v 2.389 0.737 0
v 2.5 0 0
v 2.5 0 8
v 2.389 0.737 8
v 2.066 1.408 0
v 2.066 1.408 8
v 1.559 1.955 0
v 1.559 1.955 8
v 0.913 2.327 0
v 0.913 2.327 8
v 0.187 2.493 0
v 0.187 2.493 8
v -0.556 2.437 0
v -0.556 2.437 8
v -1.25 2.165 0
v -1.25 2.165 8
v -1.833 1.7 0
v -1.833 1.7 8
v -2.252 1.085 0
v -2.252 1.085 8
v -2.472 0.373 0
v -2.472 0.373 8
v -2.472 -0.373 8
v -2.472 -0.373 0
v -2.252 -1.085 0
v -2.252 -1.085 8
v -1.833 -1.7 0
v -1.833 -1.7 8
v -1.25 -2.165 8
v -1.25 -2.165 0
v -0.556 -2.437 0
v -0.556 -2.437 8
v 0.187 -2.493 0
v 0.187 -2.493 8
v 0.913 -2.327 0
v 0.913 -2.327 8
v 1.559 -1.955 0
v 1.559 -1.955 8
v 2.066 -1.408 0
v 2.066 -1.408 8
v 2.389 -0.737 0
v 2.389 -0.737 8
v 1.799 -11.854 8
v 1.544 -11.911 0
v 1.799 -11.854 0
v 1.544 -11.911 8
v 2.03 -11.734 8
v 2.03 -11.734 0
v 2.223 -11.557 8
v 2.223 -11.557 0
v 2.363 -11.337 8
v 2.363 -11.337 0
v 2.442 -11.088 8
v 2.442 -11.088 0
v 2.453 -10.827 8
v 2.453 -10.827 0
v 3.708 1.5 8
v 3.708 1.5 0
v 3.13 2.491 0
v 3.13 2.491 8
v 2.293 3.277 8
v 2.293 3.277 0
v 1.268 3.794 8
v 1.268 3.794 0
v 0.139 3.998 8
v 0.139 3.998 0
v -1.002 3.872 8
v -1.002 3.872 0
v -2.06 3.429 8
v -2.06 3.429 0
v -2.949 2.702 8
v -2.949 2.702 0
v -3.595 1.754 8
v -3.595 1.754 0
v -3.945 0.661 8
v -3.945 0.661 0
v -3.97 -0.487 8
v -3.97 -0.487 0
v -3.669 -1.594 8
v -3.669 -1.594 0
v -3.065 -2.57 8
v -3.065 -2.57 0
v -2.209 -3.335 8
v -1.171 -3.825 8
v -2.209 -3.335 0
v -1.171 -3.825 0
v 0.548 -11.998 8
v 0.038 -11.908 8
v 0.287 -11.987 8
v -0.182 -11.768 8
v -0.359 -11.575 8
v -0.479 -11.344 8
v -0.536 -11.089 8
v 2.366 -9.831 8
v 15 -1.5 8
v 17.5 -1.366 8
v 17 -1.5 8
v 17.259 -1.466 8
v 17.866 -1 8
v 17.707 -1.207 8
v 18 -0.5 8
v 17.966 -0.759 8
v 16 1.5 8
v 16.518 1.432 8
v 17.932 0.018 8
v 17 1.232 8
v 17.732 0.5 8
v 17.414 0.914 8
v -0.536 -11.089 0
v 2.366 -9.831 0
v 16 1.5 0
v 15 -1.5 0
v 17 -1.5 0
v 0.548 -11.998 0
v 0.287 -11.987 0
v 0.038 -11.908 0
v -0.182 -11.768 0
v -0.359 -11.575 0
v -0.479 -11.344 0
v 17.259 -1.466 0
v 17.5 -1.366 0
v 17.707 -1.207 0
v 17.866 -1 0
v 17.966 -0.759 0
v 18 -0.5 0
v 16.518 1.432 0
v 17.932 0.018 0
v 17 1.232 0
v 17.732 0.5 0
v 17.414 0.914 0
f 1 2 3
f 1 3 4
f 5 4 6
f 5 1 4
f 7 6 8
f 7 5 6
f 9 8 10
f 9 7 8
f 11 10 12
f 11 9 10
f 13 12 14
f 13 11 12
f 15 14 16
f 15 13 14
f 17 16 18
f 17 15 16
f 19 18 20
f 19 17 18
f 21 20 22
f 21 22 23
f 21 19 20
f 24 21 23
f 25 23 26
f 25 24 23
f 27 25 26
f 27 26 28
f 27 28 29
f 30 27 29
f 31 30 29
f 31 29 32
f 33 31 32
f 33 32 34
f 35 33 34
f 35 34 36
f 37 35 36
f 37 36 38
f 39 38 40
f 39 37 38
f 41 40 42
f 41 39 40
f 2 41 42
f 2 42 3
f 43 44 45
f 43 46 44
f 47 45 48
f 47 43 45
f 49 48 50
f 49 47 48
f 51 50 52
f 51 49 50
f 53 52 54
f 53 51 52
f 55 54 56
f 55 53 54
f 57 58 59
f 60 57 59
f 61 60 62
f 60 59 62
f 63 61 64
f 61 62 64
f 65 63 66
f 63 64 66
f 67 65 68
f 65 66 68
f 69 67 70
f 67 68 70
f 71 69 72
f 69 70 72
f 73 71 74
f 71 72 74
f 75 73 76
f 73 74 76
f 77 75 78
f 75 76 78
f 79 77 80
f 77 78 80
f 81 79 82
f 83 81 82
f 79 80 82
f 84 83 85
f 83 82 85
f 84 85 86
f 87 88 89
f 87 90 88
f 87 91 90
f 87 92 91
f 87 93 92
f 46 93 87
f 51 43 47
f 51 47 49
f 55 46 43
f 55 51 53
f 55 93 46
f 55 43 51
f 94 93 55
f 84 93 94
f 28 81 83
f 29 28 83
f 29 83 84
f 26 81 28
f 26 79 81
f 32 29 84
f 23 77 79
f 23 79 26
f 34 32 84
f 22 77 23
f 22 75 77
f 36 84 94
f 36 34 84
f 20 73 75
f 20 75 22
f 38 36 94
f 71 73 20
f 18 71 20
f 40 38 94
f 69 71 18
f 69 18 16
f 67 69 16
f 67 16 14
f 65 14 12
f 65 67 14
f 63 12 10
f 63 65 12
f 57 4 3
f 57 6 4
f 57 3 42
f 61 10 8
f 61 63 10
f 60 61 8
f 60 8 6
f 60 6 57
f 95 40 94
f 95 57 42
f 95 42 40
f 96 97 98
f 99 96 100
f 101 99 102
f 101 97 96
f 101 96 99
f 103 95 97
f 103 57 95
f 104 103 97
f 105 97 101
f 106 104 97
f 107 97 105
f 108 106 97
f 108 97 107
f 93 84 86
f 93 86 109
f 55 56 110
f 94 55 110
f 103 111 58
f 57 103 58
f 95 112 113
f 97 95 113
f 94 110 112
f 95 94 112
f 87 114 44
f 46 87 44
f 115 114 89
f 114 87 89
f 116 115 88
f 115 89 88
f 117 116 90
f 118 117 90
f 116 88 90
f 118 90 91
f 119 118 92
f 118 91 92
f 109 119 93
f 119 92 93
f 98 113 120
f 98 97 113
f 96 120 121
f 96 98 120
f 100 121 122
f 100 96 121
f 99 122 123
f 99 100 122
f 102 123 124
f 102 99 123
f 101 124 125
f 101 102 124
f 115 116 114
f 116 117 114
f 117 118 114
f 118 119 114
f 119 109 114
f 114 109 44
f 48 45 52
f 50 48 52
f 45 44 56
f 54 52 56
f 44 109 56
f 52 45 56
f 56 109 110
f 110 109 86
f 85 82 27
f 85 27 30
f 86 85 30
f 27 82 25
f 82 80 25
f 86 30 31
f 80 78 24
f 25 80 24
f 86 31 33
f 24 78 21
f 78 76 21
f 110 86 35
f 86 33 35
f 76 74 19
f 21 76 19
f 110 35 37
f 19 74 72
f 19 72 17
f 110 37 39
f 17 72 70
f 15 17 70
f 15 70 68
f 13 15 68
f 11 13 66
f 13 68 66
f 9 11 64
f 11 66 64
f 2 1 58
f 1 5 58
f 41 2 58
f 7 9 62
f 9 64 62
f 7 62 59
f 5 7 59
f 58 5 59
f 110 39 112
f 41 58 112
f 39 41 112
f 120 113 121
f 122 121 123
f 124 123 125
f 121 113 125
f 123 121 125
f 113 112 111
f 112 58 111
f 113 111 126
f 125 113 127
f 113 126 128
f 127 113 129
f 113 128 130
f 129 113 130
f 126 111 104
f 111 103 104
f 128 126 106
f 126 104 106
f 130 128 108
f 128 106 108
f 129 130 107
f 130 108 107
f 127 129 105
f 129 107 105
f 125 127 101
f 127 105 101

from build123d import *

# Parameters (mm, degrees)
SKETCH1_R           = 2.5
BOSS_EXTRUDE1_DEPTH = 8
FILLET1_R           = 1
FILLET2_R           = 2


with BuildPart() as part:
    # Sketch1 → Boss-Extrude1 (new body)
    with BuildSketch(Plane.XY):
        with BuildLine():
            Line((-0.448423134, -12.085069991), (2.54016096, -11.823602763))
            Line((2.54016096, -11.823602763), (2.365849475, -9.831213367))
            Line((2.365849475, -9.831213367), (15, -1.5))
            Line((15, -1.5), (18, -1.5))
            Line((18, -1.5), (18, 1.5))
            Line((18, 1.5), (3.708099244, 1.5))
            ThreePointArc((3.708099244, 1.5), (-2.949109347, 2.70236083), (-1.171109903, -3.824722421))
            Line((-1.171109903, -3.824722421), (-0.448423134, -12.085069991))
        make_face()
        Circle(SKETCH1_R, mode=Mode.SUBTRACT)
    extrude(amount=BOSS_EXTRUDE1_DEPTH)

    # Fillet1
    fillet1_edges = [part.edges().sort_by_distance(p)[0] for p in [
        (2.54016096, -11.823602763, 4),
        (18, -1.5, 4),
        (-0.448423134, -12.085069991, 4),
    ]]
    fillet(fillet1_edges, radius=FILLET1_R)

    # Fillet2
    fillet2_edges = [part.edges().sort_by_distance(p)[0] for p in [
        (18, 1.5, 4),
    ]]
    fillet(fillet2_edges, radius=FILLET2_R - 0.0001)  # a hair under: the kernel refuses the full size


solid = part.part
